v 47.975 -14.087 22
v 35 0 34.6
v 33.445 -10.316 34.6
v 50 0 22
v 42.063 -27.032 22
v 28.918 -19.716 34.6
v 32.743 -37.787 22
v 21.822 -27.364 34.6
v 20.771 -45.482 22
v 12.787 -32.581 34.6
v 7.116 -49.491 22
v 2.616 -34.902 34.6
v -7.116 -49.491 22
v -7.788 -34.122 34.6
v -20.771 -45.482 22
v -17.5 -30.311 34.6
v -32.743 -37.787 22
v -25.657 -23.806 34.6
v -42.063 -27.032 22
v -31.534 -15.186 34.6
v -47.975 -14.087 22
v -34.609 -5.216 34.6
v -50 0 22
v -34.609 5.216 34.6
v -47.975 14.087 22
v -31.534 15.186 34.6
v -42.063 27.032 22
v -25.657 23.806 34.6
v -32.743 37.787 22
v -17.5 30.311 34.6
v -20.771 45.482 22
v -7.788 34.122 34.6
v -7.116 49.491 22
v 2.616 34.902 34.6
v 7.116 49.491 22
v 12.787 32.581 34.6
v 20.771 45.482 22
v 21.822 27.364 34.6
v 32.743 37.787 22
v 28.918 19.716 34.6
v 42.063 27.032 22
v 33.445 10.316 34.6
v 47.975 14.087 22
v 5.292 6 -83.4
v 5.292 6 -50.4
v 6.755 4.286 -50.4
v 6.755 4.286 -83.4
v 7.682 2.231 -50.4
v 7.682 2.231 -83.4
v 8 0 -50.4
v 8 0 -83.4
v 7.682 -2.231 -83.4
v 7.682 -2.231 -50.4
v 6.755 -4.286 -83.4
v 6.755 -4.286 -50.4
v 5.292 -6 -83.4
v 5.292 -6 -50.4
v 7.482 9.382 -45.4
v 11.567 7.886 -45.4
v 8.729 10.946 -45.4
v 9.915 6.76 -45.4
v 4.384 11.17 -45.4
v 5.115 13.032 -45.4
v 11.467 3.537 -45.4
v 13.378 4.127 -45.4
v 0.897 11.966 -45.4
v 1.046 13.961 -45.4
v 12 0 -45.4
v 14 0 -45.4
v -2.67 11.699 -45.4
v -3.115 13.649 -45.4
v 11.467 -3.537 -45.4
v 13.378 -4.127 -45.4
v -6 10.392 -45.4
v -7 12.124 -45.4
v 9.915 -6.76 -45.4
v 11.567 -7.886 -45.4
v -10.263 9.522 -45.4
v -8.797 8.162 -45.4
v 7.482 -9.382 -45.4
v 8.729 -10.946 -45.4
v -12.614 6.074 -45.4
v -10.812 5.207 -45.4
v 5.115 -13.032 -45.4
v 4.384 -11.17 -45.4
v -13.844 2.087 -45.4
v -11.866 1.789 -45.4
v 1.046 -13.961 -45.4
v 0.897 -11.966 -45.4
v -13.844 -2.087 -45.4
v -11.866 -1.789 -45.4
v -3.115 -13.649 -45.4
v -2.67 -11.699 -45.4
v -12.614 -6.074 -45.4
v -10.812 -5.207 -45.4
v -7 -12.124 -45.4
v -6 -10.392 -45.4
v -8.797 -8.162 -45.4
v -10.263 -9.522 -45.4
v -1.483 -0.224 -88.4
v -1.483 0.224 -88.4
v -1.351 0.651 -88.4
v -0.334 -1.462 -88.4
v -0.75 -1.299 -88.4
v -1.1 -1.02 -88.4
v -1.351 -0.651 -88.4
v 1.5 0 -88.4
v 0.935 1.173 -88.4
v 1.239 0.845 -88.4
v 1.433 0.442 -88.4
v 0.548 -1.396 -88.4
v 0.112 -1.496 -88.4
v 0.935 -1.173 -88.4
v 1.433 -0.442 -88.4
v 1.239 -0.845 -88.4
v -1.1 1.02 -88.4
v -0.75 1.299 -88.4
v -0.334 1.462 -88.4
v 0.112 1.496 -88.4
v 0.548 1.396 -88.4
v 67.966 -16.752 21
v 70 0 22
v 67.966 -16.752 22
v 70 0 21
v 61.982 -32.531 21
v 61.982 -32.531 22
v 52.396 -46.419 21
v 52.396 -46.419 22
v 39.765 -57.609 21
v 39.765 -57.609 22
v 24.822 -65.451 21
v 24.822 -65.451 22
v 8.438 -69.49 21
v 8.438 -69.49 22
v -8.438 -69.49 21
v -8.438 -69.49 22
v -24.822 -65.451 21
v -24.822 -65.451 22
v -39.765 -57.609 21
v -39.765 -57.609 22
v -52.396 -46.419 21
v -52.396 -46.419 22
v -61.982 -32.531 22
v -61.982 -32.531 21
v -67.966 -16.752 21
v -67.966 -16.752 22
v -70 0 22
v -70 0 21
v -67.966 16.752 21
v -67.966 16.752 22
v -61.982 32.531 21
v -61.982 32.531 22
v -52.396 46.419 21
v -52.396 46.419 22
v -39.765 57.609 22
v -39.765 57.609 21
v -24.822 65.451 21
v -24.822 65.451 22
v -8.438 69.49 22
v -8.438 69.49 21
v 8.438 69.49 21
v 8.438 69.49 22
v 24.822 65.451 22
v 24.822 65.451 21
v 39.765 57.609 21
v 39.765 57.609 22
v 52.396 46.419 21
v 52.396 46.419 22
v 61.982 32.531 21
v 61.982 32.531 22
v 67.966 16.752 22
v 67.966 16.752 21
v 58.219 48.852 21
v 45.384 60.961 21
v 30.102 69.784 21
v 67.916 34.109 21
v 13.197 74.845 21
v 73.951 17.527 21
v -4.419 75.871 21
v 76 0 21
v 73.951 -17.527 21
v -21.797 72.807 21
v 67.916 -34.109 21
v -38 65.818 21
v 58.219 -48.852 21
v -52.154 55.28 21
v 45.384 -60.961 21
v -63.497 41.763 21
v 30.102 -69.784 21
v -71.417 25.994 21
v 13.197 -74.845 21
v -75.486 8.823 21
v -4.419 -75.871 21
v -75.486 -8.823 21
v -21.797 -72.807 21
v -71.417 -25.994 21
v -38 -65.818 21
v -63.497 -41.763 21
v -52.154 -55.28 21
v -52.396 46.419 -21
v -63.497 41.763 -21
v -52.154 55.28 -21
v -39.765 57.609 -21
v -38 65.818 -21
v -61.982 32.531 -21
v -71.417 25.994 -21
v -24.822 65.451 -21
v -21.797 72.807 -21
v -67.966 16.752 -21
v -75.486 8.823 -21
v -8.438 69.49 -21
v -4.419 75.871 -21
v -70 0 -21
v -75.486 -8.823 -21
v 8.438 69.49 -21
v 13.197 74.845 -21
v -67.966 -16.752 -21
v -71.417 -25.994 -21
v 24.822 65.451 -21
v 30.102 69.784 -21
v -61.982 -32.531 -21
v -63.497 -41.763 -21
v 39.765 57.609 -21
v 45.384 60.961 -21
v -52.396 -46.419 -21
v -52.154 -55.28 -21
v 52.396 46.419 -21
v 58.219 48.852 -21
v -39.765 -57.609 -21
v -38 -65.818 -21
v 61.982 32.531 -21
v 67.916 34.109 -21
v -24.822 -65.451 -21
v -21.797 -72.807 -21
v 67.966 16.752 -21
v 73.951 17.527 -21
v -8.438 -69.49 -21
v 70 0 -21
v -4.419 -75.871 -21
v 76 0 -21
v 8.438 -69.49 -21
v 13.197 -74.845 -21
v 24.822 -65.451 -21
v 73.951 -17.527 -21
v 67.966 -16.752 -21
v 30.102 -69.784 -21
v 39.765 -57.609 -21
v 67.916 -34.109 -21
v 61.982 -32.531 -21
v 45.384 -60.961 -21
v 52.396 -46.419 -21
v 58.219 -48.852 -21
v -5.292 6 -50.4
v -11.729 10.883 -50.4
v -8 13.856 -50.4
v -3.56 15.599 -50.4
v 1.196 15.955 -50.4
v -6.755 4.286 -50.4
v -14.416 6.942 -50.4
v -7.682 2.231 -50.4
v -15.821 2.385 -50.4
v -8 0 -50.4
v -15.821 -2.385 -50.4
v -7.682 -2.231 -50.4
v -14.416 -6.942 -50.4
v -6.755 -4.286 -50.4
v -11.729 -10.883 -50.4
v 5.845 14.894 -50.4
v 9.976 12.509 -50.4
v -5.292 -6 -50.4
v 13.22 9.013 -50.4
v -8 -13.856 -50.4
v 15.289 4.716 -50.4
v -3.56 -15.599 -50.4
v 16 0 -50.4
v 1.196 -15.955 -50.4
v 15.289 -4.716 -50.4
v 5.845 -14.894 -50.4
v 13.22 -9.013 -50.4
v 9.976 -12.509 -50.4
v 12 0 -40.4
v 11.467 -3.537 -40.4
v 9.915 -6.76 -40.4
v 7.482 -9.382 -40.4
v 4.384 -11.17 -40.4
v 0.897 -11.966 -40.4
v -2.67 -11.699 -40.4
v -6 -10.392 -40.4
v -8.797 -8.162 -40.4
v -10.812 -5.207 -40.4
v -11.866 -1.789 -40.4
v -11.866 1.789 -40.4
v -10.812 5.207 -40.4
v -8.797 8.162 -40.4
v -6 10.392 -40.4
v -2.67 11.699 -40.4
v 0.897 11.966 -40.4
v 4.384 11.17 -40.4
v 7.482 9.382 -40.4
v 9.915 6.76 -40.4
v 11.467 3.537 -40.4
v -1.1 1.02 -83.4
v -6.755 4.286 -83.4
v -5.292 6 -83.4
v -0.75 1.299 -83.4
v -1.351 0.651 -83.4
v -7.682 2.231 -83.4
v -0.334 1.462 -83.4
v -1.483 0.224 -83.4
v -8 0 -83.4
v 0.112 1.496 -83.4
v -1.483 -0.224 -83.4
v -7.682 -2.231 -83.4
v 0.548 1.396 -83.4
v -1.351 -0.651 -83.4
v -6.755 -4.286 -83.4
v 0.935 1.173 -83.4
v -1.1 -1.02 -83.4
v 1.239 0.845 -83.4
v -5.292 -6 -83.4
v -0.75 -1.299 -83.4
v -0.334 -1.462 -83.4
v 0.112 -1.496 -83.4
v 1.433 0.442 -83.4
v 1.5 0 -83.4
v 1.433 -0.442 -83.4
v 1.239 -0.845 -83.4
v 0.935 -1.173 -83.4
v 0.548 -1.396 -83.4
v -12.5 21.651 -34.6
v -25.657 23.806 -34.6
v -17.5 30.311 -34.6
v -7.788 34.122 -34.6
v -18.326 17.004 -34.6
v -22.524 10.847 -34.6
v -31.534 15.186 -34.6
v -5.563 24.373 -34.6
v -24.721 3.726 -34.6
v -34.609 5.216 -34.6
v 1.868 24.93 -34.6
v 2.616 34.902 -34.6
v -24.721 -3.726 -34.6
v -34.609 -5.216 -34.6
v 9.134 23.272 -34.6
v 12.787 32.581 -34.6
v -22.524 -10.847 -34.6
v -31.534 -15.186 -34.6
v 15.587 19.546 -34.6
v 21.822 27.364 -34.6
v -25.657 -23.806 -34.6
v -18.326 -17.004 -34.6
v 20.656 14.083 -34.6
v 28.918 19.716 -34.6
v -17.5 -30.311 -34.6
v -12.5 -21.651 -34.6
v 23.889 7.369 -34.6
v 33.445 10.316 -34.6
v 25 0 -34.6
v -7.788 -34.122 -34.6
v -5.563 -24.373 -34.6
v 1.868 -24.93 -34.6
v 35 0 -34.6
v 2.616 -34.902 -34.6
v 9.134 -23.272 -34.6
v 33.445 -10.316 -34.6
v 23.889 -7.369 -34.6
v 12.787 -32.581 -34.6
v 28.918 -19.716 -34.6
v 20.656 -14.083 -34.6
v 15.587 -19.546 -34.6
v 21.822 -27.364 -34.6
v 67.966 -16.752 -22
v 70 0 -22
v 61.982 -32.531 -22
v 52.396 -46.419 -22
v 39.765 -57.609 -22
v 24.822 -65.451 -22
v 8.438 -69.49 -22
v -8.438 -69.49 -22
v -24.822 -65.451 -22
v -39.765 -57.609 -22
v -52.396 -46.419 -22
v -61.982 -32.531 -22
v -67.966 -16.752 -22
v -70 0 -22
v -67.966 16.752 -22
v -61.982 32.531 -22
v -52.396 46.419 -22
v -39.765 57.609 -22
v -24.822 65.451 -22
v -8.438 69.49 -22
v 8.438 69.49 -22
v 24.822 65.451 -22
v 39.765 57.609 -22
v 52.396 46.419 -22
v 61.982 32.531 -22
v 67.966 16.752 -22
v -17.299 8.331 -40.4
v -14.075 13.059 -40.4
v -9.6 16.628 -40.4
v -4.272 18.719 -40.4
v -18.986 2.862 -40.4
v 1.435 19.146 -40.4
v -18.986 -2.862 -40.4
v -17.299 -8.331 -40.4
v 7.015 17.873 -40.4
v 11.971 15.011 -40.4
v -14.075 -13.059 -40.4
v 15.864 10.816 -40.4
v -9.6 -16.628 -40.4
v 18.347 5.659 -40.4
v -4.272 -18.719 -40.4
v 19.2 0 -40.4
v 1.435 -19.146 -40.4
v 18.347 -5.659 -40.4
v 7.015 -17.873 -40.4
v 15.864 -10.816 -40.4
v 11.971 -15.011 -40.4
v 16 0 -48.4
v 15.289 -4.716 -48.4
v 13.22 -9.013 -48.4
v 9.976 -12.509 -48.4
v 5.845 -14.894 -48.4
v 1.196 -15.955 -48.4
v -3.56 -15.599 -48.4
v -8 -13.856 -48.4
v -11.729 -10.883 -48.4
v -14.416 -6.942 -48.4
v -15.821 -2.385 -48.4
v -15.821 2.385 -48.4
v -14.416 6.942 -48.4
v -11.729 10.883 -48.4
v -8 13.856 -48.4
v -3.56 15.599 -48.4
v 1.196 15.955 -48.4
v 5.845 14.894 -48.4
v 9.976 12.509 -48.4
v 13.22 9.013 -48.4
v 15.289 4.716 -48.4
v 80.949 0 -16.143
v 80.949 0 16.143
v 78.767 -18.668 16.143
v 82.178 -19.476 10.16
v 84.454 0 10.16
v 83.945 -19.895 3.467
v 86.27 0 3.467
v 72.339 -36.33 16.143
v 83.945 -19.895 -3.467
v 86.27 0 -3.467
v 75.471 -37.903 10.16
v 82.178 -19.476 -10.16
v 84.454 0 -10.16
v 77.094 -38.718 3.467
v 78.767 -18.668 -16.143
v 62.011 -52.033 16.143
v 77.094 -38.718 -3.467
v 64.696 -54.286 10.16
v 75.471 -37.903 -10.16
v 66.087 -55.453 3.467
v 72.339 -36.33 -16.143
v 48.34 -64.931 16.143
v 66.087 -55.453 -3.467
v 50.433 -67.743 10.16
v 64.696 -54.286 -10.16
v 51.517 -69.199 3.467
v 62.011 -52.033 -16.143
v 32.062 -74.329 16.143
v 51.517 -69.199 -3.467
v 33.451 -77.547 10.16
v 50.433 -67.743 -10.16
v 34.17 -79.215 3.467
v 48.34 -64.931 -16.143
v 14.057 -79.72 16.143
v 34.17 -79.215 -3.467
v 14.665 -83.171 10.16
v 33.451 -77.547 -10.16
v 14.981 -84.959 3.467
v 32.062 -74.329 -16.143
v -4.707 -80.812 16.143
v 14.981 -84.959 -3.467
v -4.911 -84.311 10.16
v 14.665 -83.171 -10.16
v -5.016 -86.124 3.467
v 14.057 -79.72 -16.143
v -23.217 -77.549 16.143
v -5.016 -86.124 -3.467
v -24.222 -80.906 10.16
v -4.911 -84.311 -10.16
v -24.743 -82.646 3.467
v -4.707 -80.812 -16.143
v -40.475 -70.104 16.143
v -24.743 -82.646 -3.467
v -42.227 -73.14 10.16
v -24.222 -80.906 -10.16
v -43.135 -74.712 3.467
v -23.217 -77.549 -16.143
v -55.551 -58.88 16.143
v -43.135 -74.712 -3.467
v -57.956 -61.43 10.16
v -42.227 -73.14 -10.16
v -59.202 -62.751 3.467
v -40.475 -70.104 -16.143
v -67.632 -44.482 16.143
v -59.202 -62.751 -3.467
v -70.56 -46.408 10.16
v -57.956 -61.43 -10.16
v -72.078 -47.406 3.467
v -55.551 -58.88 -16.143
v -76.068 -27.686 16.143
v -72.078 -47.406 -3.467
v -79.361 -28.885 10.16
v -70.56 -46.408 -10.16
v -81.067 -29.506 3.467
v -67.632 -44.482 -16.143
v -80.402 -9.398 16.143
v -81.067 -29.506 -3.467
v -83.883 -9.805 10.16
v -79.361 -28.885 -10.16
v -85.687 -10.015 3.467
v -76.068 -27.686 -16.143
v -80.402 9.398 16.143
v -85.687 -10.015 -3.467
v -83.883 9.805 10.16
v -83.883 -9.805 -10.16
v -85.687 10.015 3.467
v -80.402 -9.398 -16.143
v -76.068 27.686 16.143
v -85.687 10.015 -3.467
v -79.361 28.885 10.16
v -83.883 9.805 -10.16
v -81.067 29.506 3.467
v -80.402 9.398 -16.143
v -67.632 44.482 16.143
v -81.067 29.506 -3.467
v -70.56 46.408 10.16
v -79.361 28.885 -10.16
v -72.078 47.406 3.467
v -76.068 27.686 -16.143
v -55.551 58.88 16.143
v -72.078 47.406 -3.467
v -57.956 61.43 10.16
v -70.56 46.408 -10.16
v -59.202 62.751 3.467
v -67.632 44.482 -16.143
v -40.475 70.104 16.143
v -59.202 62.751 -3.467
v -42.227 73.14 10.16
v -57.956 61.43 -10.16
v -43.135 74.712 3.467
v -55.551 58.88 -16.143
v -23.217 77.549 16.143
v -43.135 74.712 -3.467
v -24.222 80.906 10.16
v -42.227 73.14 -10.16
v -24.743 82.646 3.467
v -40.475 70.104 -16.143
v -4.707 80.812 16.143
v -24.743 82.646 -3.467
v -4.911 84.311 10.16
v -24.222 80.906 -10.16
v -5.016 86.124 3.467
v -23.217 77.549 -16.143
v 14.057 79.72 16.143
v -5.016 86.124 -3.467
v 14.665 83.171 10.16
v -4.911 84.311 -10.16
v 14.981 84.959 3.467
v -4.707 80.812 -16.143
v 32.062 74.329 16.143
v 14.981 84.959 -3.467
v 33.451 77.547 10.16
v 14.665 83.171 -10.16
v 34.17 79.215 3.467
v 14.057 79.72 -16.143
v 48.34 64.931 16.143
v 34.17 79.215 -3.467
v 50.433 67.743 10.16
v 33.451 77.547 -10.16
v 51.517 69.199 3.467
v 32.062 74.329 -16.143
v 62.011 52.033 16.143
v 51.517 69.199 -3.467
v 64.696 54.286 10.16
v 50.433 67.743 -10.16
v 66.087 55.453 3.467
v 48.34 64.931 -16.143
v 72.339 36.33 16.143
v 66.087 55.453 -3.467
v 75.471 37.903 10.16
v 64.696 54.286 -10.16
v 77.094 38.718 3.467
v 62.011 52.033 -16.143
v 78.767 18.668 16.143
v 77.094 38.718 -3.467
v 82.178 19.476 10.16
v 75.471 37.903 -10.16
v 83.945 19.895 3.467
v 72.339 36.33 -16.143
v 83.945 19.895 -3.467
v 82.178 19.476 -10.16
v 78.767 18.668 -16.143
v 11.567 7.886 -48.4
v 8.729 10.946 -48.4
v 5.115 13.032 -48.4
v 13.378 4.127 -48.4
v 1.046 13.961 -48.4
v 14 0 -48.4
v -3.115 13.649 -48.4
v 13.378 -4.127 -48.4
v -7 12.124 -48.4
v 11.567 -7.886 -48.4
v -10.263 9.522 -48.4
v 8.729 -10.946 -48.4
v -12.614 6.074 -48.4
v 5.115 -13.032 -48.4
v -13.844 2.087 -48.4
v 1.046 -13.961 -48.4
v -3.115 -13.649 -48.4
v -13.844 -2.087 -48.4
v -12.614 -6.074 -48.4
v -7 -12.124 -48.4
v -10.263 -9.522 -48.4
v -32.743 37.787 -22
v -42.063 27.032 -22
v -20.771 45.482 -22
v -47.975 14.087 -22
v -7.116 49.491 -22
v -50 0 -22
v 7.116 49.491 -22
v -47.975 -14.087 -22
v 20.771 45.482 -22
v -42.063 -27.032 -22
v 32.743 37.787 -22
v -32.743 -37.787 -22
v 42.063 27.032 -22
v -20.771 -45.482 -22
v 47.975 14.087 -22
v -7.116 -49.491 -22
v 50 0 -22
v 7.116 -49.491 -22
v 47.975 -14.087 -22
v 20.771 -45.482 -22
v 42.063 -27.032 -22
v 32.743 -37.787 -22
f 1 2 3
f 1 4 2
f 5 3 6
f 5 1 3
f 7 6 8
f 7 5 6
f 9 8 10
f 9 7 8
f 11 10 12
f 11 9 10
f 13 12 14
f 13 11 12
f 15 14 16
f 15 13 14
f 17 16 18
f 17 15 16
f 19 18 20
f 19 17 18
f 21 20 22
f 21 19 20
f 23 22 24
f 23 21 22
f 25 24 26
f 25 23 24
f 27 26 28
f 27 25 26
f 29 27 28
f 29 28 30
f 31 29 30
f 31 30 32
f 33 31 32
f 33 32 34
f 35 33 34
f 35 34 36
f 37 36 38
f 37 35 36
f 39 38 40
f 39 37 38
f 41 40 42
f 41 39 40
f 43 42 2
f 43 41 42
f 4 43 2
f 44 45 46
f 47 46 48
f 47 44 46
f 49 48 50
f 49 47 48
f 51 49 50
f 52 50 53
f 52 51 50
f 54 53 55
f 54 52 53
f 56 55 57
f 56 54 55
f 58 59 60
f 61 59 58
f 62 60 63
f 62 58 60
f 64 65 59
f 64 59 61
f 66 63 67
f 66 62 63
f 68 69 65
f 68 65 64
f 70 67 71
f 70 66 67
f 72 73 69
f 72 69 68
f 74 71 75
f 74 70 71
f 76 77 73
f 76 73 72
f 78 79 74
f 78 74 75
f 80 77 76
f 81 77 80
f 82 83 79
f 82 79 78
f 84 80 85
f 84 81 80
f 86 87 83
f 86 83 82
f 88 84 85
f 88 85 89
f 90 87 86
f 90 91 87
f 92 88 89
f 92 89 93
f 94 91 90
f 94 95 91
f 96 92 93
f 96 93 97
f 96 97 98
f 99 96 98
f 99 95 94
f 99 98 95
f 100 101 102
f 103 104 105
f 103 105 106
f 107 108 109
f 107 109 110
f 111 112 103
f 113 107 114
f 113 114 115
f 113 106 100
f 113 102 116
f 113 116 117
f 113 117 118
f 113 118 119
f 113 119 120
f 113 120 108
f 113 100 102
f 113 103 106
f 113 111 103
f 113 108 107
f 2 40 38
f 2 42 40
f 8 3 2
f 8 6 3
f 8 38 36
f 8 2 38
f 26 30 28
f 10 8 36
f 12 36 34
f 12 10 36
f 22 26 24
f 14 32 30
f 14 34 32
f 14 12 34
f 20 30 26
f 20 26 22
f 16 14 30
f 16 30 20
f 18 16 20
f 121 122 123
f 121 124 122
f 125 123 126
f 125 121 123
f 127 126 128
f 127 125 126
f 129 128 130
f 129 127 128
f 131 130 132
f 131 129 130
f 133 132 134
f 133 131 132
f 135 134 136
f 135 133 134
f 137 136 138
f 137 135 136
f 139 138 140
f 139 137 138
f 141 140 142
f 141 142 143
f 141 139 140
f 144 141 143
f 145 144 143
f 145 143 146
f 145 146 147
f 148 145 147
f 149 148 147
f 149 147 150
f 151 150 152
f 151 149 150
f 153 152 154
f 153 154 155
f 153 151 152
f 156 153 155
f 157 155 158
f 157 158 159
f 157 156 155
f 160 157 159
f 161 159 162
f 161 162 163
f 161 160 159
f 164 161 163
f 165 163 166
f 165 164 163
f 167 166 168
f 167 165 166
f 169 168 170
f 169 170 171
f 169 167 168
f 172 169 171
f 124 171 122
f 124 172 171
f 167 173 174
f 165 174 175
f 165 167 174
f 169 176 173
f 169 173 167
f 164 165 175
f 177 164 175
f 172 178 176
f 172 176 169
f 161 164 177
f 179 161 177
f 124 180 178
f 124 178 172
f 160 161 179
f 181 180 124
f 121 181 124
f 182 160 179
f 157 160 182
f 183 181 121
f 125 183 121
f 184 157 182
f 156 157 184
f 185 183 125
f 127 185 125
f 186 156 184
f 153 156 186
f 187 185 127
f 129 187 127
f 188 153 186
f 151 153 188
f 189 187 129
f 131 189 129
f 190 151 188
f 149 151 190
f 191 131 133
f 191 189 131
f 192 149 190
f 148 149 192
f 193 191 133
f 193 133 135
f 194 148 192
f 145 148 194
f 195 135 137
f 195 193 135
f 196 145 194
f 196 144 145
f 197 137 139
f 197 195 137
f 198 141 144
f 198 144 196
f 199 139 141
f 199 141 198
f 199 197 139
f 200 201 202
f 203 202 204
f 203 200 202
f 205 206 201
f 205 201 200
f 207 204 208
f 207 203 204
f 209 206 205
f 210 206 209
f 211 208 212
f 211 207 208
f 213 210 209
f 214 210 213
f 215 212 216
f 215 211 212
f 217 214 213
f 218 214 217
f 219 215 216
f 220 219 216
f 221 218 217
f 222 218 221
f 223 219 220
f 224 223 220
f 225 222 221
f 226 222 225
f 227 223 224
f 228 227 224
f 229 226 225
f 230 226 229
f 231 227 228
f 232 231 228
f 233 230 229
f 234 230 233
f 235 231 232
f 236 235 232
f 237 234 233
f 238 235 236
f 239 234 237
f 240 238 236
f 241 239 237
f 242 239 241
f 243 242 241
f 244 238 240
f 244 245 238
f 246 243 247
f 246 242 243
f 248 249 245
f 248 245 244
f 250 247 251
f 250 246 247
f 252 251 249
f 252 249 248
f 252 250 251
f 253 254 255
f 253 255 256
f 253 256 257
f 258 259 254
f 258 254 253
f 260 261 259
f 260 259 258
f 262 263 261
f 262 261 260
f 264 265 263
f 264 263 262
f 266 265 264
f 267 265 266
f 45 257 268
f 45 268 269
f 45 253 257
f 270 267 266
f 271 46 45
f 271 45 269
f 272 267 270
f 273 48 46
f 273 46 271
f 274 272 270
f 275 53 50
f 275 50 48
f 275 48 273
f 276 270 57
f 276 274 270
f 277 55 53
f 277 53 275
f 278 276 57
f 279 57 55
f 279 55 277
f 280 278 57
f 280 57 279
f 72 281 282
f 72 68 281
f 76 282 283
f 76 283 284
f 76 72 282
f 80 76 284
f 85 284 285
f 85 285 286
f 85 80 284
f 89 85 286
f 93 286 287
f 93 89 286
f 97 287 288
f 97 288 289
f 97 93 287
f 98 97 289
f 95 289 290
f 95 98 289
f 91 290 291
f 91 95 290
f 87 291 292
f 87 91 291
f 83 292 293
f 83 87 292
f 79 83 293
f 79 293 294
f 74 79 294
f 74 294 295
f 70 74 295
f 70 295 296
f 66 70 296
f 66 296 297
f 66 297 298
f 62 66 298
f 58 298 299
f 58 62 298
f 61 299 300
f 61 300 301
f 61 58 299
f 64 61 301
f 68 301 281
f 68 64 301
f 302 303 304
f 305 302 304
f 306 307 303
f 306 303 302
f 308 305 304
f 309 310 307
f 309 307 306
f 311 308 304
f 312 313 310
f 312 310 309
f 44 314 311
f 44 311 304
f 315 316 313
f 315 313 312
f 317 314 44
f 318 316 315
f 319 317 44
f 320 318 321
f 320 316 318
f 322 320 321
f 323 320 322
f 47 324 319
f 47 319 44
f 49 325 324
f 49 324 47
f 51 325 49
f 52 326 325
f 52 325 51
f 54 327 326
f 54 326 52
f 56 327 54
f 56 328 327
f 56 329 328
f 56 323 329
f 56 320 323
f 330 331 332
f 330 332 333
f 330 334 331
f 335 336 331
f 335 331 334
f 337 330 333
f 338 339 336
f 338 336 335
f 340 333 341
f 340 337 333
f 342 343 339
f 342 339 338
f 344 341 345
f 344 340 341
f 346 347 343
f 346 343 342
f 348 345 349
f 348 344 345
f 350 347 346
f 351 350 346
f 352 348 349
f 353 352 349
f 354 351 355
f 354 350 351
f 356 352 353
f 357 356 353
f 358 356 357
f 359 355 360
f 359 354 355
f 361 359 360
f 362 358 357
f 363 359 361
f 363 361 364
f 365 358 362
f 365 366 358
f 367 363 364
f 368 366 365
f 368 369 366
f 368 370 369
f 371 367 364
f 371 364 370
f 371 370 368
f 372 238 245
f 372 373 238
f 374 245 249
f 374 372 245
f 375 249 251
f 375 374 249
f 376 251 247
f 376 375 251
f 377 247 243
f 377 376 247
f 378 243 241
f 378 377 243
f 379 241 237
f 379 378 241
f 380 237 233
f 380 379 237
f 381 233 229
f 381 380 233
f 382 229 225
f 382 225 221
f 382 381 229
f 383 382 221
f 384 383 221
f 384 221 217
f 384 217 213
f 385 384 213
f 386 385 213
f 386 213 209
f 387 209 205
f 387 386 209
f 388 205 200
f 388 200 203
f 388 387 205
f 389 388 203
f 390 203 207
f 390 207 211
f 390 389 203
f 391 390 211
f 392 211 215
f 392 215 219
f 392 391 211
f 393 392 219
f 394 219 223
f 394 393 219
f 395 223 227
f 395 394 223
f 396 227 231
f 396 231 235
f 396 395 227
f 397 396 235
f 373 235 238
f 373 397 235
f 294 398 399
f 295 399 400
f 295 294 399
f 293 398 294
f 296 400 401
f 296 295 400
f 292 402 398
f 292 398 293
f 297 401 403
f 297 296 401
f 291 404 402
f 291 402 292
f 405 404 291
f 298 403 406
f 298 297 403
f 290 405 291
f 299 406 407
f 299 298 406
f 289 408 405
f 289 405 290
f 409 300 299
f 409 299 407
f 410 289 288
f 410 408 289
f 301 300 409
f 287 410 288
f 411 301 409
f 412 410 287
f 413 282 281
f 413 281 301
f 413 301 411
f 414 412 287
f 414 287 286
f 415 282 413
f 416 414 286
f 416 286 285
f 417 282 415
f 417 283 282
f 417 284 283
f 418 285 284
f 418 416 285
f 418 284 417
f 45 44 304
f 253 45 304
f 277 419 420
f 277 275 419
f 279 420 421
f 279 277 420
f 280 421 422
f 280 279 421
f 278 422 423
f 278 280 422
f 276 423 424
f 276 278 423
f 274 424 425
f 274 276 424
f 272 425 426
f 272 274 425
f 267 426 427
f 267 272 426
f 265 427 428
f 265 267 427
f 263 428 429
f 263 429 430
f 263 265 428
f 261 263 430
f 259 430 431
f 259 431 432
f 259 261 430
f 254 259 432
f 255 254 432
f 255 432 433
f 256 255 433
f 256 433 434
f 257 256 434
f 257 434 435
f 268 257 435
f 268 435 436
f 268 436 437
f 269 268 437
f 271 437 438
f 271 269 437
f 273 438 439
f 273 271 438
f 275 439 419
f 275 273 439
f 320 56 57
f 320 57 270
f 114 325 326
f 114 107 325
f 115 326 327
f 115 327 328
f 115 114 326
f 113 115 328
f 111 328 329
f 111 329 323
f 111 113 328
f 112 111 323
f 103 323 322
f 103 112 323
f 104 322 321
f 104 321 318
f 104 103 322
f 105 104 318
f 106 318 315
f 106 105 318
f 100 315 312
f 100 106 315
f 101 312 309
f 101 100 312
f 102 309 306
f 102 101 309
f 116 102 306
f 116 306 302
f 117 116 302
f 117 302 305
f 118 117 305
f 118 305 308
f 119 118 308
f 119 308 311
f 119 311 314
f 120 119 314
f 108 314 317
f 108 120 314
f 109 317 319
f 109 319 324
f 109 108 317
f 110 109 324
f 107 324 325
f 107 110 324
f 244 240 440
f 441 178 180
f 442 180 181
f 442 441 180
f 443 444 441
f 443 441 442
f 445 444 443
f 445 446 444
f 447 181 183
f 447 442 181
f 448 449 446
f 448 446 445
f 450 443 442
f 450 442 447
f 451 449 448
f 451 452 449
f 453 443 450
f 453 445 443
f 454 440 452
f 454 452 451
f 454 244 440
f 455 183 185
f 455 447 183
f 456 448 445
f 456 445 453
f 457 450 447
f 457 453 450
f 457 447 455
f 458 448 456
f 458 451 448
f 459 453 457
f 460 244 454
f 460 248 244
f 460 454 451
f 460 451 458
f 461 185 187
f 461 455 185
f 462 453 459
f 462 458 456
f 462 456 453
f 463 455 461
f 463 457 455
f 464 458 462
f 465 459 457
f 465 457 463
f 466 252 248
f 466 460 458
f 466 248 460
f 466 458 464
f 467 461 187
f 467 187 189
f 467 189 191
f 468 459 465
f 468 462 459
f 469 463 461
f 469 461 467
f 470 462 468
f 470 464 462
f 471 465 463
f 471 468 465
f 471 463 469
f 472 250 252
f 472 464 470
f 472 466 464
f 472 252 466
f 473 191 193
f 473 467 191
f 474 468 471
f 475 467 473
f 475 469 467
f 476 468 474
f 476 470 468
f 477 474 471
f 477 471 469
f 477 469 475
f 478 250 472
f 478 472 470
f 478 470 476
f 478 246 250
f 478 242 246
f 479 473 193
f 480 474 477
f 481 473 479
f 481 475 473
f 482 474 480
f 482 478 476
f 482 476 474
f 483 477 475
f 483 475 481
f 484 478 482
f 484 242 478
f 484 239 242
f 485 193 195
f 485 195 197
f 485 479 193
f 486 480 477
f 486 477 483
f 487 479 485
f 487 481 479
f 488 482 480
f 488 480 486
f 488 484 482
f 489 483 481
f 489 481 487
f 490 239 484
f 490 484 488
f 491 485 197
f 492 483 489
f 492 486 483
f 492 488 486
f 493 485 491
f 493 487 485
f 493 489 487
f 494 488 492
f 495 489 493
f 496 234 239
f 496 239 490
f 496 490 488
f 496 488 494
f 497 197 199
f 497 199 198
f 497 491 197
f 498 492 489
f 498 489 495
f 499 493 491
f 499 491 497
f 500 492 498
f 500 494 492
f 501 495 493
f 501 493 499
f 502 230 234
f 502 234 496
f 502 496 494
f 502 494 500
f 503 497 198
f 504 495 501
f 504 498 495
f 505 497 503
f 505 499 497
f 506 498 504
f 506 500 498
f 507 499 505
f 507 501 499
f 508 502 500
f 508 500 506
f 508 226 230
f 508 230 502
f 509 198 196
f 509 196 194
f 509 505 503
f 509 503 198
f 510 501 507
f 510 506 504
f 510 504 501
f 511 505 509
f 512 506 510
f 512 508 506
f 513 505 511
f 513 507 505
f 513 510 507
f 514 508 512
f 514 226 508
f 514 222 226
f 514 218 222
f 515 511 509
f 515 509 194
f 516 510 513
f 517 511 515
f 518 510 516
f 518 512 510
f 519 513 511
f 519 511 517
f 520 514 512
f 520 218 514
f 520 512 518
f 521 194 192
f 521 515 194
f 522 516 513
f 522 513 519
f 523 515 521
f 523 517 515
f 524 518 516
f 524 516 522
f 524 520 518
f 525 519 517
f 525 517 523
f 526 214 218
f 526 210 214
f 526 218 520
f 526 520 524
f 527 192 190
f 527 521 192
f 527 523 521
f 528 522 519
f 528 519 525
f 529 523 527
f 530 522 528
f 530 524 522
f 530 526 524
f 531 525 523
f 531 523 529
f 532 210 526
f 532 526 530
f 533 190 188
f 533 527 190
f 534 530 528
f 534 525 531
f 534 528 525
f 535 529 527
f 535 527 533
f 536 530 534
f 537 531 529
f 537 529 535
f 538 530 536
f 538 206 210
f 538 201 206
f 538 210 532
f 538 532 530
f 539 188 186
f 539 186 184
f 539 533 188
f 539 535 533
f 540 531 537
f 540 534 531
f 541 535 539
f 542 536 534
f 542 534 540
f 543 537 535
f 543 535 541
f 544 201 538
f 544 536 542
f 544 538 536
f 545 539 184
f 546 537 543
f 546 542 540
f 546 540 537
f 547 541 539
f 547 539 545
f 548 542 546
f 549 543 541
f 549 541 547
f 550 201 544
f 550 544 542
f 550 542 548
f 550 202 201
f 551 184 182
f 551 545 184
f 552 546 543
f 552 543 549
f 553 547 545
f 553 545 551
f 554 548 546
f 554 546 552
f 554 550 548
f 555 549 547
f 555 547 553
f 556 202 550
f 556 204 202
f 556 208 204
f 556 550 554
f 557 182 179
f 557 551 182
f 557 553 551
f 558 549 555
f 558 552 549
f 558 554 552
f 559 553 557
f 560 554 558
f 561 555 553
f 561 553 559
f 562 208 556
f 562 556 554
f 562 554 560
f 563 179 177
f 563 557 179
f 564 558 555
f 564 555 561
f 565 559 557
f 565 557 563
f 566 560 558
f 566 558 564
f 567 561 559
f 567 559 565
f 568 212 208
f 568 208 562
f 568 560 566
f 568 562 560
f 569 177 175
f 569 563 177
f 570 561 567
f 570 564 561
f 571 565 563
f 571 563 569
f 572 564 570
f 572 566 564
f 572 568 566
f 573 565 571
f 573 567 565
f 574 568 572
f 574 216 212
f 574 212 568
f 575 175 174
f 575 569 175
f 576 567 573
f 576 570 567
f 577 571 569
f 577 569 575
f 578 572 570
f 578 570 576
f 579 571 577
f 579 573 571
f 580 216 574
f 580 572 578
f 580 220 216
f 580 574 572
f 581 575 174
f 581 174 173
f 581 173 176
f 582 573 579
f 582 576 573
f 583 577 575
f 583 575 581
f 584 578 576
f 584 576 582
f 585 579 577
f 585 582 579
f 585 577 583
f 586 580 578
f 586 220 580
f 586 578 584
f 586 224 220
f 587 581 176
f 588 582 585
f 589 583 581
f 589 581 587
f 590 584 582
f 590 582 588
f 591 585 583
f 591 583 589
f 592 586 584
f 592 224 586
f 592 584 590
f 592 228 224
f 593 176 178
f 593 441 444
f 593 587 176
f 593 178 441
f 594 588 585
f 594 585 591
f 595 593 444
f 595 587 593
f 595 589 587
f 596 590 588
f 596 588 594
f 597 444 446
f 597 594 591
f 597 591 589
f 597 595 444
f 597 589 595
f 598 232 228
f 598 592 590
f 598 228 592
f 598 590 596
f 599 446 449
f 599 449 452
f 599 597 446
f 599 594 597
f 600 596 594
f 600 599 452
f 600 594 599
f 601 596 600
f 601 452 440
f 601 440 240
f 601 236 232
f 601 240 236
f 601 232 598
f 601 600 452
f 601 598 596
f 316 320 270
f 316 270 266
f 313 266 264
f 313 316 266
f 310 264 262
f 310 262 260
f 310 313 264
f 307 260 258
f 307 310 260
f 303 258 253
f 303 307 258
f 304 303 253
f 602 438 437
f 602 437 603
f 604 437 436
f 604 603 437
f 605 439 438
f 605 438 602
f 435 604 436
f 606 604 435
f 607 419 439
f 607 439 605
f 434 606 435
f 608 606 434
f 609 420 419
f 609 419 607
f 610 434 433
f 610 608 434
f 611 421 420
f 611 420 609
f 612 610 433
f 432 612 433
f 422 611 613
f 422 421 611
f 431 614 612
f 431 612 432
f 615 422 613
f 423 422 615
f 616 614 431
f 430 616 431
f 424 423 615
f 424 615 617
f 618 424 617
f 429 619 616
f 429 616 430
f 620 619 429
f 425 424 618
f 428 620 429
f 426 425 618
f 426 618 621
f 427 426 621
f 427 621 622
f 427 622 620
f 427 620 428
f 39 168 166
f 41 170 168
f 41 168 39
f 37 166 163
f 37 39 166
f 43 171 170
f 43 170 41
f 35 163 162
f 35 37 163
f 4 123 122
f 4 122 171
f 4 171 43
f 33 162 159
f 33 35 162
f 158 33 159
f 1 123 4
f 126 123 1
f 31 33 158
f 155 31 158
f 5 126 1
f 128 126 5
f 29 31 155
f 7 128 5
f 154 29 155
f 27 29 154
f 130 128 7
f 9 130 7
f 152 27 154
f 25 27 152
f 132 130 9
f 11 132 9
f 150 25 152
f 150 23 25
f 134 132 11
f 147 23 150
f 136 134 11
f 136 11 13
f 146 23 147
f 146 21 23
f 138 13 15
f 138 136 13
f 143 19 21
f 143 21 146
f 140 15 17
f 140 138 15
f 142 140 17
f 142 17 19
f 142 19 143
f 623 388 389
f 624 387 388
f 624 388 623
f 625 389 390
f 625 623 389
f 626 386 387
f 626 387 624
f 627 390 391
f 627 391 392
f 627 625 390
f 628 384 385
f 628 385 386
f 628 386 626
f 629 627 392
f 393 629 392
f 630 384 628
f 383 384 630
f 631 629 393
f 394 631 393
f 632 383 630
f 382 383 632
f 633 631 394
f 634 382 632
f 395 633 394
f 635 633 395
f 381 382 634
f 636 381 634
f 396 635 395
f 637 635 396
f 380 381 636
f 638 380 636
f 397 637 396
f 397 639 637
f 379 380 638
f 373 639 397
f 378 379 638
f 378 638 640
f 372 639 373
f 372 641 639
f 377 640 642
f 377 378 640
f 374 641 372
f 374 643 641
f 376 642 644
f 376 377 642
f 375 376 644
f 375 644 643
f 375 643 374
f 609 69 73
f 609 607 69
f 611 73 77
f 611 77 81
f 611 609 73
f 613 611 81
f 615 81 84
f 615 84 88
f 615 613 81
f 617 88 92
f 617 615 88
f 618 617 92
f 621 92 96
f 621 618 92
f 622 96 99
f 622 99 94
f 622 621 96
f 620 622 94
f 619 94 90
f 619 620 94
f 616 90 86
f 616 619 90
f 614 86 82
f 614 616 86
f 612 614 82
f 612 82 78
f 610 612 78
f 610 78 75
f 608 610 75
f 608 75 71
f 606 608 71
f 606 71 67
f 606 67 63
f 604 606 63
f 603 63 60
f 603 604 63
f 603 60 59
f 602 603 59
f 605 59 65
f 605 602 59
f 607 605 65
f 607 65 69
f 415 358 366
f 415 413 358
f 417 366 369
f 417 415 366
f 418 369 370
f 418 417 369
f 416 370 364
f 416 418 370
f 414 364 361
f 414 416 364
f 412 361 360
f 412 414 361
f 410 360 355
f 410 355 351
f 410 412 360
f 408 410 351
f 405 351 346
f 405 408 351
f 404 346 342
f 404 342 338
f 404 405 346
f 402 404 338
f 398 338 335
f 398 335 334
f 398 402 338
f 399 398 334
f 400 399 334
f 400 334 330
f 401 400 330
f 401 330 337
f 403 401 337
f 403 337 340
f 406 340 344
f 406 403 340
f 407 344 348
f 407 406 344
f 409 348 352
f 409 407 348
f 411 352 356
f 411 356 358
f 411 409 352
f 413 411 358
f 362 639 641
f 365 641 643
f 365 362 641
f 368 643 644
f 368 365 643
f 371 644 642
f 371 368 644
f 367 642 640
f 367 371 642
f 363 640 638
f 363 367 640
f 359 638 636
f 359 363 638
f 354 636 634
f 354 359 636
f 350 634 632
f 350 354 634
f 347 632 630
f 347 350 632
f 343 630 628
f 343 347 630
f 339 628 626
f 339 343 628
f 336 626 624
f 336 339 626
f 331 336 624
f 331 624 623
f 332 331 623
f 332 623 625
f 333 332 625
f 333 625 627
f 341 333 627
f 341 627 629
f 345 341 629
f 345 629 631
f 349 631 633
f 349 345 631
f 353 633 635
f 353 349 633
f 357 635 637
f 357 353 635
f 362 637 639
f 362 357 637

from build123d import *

# Parameters (mm, degrees)
CUT_EXTRUDE_1_DEPTH      = 170.966173207
CUT_EXTRUDE_1_DEPTH_BACK = 33


with BuildPart() as part:
    # 草图1 → 旋转1 (revolve)
    with BuildSketch(Plane(origin=(0, 0, 0), x_dir=(0, 0, -1), z_dir=(1, 0, 0)), mode=Mode.PRIVATE) as revolve_1_sk:
        with BuildLine():
            Line((-34.6, 0), (-34.6, 35))
            Line((-34.6, 35), (-22, 50))
            Line((-22, 50), (-22, 70))
            Line((-22, 70), (-21, 70))
            Line((-21, 70), (-21, 76))
            ThreePointArc((-21, 76), (0, 86.5), (21, 76))
            Line((21, 76), (21, 70))
            Line((21, 70), (22, 70))
            Line((22, 70), (22, 50))
            Line((22, 50), (34.6, 35))
            Line((34.6, 35), (34.6, 25))
            Line((34.6, 25), (40.4, 19.2))
            Line((40.4, 19.2), (40.4, 12))
            Line((40.4, 12), (45.4, 12))
            Line((45.4, 12), (45.4, 14))
            Line((45.4, 14), (48.4, 14))
            Line((48.4, 14), (48.4, 16))
            Line((48.4, 16), (50.4, 16))
            Line((50.4, 16), (50.4, 8))
            Line((50.4, 8), (83.4, 8))
            Line((83.4, 8), (83.4, 1.5))
            Line((83.4, 1.5), (88.4, 1.5))
            Line((88.4, 1.5), (88.4, 0))
            Line((88.4, 0), (-34.6, 0))
        make_face()
    revolve(revolve_1_sk.sketch.rotate(Axis((0, 0, 0), (0, 0, -1)), 90), axis=Axis((0, 0, 0), (0, 0, -1)))

    # 草图2 → 切除-拉伸1 (cut, two sides: drawn at the far end of the back side and taken through both)
    with BuildSketch(Plane(origin=(0, 0, -83.4), x_dir=(-1, 0, 0), z_dir=(0, 0, -1)).offset(-CUT_EXTRUDE_1_DEPTH_BACK)):
        with BuildLine():
            Line((-5.291502622, 6), (5.291502622, 6))
            ThreePointArc((5.291502622, 6), (0, 8), (-5.291502622, 6))
        make_face()
        with BuildLine():
            Line((-5.291502622, -6), (5.291502622, -6))
            ThreePointArc((5.291502622, -6), (0, -8), (-5.291502622, -6))
        make_face()
    extrude(amount=CUT_EXTRUDE_1_DEPTH + CUT_EXTRUDE_1_DEPTH_BACK, mode=Mode.SUBTRACT)


solid = part.part
